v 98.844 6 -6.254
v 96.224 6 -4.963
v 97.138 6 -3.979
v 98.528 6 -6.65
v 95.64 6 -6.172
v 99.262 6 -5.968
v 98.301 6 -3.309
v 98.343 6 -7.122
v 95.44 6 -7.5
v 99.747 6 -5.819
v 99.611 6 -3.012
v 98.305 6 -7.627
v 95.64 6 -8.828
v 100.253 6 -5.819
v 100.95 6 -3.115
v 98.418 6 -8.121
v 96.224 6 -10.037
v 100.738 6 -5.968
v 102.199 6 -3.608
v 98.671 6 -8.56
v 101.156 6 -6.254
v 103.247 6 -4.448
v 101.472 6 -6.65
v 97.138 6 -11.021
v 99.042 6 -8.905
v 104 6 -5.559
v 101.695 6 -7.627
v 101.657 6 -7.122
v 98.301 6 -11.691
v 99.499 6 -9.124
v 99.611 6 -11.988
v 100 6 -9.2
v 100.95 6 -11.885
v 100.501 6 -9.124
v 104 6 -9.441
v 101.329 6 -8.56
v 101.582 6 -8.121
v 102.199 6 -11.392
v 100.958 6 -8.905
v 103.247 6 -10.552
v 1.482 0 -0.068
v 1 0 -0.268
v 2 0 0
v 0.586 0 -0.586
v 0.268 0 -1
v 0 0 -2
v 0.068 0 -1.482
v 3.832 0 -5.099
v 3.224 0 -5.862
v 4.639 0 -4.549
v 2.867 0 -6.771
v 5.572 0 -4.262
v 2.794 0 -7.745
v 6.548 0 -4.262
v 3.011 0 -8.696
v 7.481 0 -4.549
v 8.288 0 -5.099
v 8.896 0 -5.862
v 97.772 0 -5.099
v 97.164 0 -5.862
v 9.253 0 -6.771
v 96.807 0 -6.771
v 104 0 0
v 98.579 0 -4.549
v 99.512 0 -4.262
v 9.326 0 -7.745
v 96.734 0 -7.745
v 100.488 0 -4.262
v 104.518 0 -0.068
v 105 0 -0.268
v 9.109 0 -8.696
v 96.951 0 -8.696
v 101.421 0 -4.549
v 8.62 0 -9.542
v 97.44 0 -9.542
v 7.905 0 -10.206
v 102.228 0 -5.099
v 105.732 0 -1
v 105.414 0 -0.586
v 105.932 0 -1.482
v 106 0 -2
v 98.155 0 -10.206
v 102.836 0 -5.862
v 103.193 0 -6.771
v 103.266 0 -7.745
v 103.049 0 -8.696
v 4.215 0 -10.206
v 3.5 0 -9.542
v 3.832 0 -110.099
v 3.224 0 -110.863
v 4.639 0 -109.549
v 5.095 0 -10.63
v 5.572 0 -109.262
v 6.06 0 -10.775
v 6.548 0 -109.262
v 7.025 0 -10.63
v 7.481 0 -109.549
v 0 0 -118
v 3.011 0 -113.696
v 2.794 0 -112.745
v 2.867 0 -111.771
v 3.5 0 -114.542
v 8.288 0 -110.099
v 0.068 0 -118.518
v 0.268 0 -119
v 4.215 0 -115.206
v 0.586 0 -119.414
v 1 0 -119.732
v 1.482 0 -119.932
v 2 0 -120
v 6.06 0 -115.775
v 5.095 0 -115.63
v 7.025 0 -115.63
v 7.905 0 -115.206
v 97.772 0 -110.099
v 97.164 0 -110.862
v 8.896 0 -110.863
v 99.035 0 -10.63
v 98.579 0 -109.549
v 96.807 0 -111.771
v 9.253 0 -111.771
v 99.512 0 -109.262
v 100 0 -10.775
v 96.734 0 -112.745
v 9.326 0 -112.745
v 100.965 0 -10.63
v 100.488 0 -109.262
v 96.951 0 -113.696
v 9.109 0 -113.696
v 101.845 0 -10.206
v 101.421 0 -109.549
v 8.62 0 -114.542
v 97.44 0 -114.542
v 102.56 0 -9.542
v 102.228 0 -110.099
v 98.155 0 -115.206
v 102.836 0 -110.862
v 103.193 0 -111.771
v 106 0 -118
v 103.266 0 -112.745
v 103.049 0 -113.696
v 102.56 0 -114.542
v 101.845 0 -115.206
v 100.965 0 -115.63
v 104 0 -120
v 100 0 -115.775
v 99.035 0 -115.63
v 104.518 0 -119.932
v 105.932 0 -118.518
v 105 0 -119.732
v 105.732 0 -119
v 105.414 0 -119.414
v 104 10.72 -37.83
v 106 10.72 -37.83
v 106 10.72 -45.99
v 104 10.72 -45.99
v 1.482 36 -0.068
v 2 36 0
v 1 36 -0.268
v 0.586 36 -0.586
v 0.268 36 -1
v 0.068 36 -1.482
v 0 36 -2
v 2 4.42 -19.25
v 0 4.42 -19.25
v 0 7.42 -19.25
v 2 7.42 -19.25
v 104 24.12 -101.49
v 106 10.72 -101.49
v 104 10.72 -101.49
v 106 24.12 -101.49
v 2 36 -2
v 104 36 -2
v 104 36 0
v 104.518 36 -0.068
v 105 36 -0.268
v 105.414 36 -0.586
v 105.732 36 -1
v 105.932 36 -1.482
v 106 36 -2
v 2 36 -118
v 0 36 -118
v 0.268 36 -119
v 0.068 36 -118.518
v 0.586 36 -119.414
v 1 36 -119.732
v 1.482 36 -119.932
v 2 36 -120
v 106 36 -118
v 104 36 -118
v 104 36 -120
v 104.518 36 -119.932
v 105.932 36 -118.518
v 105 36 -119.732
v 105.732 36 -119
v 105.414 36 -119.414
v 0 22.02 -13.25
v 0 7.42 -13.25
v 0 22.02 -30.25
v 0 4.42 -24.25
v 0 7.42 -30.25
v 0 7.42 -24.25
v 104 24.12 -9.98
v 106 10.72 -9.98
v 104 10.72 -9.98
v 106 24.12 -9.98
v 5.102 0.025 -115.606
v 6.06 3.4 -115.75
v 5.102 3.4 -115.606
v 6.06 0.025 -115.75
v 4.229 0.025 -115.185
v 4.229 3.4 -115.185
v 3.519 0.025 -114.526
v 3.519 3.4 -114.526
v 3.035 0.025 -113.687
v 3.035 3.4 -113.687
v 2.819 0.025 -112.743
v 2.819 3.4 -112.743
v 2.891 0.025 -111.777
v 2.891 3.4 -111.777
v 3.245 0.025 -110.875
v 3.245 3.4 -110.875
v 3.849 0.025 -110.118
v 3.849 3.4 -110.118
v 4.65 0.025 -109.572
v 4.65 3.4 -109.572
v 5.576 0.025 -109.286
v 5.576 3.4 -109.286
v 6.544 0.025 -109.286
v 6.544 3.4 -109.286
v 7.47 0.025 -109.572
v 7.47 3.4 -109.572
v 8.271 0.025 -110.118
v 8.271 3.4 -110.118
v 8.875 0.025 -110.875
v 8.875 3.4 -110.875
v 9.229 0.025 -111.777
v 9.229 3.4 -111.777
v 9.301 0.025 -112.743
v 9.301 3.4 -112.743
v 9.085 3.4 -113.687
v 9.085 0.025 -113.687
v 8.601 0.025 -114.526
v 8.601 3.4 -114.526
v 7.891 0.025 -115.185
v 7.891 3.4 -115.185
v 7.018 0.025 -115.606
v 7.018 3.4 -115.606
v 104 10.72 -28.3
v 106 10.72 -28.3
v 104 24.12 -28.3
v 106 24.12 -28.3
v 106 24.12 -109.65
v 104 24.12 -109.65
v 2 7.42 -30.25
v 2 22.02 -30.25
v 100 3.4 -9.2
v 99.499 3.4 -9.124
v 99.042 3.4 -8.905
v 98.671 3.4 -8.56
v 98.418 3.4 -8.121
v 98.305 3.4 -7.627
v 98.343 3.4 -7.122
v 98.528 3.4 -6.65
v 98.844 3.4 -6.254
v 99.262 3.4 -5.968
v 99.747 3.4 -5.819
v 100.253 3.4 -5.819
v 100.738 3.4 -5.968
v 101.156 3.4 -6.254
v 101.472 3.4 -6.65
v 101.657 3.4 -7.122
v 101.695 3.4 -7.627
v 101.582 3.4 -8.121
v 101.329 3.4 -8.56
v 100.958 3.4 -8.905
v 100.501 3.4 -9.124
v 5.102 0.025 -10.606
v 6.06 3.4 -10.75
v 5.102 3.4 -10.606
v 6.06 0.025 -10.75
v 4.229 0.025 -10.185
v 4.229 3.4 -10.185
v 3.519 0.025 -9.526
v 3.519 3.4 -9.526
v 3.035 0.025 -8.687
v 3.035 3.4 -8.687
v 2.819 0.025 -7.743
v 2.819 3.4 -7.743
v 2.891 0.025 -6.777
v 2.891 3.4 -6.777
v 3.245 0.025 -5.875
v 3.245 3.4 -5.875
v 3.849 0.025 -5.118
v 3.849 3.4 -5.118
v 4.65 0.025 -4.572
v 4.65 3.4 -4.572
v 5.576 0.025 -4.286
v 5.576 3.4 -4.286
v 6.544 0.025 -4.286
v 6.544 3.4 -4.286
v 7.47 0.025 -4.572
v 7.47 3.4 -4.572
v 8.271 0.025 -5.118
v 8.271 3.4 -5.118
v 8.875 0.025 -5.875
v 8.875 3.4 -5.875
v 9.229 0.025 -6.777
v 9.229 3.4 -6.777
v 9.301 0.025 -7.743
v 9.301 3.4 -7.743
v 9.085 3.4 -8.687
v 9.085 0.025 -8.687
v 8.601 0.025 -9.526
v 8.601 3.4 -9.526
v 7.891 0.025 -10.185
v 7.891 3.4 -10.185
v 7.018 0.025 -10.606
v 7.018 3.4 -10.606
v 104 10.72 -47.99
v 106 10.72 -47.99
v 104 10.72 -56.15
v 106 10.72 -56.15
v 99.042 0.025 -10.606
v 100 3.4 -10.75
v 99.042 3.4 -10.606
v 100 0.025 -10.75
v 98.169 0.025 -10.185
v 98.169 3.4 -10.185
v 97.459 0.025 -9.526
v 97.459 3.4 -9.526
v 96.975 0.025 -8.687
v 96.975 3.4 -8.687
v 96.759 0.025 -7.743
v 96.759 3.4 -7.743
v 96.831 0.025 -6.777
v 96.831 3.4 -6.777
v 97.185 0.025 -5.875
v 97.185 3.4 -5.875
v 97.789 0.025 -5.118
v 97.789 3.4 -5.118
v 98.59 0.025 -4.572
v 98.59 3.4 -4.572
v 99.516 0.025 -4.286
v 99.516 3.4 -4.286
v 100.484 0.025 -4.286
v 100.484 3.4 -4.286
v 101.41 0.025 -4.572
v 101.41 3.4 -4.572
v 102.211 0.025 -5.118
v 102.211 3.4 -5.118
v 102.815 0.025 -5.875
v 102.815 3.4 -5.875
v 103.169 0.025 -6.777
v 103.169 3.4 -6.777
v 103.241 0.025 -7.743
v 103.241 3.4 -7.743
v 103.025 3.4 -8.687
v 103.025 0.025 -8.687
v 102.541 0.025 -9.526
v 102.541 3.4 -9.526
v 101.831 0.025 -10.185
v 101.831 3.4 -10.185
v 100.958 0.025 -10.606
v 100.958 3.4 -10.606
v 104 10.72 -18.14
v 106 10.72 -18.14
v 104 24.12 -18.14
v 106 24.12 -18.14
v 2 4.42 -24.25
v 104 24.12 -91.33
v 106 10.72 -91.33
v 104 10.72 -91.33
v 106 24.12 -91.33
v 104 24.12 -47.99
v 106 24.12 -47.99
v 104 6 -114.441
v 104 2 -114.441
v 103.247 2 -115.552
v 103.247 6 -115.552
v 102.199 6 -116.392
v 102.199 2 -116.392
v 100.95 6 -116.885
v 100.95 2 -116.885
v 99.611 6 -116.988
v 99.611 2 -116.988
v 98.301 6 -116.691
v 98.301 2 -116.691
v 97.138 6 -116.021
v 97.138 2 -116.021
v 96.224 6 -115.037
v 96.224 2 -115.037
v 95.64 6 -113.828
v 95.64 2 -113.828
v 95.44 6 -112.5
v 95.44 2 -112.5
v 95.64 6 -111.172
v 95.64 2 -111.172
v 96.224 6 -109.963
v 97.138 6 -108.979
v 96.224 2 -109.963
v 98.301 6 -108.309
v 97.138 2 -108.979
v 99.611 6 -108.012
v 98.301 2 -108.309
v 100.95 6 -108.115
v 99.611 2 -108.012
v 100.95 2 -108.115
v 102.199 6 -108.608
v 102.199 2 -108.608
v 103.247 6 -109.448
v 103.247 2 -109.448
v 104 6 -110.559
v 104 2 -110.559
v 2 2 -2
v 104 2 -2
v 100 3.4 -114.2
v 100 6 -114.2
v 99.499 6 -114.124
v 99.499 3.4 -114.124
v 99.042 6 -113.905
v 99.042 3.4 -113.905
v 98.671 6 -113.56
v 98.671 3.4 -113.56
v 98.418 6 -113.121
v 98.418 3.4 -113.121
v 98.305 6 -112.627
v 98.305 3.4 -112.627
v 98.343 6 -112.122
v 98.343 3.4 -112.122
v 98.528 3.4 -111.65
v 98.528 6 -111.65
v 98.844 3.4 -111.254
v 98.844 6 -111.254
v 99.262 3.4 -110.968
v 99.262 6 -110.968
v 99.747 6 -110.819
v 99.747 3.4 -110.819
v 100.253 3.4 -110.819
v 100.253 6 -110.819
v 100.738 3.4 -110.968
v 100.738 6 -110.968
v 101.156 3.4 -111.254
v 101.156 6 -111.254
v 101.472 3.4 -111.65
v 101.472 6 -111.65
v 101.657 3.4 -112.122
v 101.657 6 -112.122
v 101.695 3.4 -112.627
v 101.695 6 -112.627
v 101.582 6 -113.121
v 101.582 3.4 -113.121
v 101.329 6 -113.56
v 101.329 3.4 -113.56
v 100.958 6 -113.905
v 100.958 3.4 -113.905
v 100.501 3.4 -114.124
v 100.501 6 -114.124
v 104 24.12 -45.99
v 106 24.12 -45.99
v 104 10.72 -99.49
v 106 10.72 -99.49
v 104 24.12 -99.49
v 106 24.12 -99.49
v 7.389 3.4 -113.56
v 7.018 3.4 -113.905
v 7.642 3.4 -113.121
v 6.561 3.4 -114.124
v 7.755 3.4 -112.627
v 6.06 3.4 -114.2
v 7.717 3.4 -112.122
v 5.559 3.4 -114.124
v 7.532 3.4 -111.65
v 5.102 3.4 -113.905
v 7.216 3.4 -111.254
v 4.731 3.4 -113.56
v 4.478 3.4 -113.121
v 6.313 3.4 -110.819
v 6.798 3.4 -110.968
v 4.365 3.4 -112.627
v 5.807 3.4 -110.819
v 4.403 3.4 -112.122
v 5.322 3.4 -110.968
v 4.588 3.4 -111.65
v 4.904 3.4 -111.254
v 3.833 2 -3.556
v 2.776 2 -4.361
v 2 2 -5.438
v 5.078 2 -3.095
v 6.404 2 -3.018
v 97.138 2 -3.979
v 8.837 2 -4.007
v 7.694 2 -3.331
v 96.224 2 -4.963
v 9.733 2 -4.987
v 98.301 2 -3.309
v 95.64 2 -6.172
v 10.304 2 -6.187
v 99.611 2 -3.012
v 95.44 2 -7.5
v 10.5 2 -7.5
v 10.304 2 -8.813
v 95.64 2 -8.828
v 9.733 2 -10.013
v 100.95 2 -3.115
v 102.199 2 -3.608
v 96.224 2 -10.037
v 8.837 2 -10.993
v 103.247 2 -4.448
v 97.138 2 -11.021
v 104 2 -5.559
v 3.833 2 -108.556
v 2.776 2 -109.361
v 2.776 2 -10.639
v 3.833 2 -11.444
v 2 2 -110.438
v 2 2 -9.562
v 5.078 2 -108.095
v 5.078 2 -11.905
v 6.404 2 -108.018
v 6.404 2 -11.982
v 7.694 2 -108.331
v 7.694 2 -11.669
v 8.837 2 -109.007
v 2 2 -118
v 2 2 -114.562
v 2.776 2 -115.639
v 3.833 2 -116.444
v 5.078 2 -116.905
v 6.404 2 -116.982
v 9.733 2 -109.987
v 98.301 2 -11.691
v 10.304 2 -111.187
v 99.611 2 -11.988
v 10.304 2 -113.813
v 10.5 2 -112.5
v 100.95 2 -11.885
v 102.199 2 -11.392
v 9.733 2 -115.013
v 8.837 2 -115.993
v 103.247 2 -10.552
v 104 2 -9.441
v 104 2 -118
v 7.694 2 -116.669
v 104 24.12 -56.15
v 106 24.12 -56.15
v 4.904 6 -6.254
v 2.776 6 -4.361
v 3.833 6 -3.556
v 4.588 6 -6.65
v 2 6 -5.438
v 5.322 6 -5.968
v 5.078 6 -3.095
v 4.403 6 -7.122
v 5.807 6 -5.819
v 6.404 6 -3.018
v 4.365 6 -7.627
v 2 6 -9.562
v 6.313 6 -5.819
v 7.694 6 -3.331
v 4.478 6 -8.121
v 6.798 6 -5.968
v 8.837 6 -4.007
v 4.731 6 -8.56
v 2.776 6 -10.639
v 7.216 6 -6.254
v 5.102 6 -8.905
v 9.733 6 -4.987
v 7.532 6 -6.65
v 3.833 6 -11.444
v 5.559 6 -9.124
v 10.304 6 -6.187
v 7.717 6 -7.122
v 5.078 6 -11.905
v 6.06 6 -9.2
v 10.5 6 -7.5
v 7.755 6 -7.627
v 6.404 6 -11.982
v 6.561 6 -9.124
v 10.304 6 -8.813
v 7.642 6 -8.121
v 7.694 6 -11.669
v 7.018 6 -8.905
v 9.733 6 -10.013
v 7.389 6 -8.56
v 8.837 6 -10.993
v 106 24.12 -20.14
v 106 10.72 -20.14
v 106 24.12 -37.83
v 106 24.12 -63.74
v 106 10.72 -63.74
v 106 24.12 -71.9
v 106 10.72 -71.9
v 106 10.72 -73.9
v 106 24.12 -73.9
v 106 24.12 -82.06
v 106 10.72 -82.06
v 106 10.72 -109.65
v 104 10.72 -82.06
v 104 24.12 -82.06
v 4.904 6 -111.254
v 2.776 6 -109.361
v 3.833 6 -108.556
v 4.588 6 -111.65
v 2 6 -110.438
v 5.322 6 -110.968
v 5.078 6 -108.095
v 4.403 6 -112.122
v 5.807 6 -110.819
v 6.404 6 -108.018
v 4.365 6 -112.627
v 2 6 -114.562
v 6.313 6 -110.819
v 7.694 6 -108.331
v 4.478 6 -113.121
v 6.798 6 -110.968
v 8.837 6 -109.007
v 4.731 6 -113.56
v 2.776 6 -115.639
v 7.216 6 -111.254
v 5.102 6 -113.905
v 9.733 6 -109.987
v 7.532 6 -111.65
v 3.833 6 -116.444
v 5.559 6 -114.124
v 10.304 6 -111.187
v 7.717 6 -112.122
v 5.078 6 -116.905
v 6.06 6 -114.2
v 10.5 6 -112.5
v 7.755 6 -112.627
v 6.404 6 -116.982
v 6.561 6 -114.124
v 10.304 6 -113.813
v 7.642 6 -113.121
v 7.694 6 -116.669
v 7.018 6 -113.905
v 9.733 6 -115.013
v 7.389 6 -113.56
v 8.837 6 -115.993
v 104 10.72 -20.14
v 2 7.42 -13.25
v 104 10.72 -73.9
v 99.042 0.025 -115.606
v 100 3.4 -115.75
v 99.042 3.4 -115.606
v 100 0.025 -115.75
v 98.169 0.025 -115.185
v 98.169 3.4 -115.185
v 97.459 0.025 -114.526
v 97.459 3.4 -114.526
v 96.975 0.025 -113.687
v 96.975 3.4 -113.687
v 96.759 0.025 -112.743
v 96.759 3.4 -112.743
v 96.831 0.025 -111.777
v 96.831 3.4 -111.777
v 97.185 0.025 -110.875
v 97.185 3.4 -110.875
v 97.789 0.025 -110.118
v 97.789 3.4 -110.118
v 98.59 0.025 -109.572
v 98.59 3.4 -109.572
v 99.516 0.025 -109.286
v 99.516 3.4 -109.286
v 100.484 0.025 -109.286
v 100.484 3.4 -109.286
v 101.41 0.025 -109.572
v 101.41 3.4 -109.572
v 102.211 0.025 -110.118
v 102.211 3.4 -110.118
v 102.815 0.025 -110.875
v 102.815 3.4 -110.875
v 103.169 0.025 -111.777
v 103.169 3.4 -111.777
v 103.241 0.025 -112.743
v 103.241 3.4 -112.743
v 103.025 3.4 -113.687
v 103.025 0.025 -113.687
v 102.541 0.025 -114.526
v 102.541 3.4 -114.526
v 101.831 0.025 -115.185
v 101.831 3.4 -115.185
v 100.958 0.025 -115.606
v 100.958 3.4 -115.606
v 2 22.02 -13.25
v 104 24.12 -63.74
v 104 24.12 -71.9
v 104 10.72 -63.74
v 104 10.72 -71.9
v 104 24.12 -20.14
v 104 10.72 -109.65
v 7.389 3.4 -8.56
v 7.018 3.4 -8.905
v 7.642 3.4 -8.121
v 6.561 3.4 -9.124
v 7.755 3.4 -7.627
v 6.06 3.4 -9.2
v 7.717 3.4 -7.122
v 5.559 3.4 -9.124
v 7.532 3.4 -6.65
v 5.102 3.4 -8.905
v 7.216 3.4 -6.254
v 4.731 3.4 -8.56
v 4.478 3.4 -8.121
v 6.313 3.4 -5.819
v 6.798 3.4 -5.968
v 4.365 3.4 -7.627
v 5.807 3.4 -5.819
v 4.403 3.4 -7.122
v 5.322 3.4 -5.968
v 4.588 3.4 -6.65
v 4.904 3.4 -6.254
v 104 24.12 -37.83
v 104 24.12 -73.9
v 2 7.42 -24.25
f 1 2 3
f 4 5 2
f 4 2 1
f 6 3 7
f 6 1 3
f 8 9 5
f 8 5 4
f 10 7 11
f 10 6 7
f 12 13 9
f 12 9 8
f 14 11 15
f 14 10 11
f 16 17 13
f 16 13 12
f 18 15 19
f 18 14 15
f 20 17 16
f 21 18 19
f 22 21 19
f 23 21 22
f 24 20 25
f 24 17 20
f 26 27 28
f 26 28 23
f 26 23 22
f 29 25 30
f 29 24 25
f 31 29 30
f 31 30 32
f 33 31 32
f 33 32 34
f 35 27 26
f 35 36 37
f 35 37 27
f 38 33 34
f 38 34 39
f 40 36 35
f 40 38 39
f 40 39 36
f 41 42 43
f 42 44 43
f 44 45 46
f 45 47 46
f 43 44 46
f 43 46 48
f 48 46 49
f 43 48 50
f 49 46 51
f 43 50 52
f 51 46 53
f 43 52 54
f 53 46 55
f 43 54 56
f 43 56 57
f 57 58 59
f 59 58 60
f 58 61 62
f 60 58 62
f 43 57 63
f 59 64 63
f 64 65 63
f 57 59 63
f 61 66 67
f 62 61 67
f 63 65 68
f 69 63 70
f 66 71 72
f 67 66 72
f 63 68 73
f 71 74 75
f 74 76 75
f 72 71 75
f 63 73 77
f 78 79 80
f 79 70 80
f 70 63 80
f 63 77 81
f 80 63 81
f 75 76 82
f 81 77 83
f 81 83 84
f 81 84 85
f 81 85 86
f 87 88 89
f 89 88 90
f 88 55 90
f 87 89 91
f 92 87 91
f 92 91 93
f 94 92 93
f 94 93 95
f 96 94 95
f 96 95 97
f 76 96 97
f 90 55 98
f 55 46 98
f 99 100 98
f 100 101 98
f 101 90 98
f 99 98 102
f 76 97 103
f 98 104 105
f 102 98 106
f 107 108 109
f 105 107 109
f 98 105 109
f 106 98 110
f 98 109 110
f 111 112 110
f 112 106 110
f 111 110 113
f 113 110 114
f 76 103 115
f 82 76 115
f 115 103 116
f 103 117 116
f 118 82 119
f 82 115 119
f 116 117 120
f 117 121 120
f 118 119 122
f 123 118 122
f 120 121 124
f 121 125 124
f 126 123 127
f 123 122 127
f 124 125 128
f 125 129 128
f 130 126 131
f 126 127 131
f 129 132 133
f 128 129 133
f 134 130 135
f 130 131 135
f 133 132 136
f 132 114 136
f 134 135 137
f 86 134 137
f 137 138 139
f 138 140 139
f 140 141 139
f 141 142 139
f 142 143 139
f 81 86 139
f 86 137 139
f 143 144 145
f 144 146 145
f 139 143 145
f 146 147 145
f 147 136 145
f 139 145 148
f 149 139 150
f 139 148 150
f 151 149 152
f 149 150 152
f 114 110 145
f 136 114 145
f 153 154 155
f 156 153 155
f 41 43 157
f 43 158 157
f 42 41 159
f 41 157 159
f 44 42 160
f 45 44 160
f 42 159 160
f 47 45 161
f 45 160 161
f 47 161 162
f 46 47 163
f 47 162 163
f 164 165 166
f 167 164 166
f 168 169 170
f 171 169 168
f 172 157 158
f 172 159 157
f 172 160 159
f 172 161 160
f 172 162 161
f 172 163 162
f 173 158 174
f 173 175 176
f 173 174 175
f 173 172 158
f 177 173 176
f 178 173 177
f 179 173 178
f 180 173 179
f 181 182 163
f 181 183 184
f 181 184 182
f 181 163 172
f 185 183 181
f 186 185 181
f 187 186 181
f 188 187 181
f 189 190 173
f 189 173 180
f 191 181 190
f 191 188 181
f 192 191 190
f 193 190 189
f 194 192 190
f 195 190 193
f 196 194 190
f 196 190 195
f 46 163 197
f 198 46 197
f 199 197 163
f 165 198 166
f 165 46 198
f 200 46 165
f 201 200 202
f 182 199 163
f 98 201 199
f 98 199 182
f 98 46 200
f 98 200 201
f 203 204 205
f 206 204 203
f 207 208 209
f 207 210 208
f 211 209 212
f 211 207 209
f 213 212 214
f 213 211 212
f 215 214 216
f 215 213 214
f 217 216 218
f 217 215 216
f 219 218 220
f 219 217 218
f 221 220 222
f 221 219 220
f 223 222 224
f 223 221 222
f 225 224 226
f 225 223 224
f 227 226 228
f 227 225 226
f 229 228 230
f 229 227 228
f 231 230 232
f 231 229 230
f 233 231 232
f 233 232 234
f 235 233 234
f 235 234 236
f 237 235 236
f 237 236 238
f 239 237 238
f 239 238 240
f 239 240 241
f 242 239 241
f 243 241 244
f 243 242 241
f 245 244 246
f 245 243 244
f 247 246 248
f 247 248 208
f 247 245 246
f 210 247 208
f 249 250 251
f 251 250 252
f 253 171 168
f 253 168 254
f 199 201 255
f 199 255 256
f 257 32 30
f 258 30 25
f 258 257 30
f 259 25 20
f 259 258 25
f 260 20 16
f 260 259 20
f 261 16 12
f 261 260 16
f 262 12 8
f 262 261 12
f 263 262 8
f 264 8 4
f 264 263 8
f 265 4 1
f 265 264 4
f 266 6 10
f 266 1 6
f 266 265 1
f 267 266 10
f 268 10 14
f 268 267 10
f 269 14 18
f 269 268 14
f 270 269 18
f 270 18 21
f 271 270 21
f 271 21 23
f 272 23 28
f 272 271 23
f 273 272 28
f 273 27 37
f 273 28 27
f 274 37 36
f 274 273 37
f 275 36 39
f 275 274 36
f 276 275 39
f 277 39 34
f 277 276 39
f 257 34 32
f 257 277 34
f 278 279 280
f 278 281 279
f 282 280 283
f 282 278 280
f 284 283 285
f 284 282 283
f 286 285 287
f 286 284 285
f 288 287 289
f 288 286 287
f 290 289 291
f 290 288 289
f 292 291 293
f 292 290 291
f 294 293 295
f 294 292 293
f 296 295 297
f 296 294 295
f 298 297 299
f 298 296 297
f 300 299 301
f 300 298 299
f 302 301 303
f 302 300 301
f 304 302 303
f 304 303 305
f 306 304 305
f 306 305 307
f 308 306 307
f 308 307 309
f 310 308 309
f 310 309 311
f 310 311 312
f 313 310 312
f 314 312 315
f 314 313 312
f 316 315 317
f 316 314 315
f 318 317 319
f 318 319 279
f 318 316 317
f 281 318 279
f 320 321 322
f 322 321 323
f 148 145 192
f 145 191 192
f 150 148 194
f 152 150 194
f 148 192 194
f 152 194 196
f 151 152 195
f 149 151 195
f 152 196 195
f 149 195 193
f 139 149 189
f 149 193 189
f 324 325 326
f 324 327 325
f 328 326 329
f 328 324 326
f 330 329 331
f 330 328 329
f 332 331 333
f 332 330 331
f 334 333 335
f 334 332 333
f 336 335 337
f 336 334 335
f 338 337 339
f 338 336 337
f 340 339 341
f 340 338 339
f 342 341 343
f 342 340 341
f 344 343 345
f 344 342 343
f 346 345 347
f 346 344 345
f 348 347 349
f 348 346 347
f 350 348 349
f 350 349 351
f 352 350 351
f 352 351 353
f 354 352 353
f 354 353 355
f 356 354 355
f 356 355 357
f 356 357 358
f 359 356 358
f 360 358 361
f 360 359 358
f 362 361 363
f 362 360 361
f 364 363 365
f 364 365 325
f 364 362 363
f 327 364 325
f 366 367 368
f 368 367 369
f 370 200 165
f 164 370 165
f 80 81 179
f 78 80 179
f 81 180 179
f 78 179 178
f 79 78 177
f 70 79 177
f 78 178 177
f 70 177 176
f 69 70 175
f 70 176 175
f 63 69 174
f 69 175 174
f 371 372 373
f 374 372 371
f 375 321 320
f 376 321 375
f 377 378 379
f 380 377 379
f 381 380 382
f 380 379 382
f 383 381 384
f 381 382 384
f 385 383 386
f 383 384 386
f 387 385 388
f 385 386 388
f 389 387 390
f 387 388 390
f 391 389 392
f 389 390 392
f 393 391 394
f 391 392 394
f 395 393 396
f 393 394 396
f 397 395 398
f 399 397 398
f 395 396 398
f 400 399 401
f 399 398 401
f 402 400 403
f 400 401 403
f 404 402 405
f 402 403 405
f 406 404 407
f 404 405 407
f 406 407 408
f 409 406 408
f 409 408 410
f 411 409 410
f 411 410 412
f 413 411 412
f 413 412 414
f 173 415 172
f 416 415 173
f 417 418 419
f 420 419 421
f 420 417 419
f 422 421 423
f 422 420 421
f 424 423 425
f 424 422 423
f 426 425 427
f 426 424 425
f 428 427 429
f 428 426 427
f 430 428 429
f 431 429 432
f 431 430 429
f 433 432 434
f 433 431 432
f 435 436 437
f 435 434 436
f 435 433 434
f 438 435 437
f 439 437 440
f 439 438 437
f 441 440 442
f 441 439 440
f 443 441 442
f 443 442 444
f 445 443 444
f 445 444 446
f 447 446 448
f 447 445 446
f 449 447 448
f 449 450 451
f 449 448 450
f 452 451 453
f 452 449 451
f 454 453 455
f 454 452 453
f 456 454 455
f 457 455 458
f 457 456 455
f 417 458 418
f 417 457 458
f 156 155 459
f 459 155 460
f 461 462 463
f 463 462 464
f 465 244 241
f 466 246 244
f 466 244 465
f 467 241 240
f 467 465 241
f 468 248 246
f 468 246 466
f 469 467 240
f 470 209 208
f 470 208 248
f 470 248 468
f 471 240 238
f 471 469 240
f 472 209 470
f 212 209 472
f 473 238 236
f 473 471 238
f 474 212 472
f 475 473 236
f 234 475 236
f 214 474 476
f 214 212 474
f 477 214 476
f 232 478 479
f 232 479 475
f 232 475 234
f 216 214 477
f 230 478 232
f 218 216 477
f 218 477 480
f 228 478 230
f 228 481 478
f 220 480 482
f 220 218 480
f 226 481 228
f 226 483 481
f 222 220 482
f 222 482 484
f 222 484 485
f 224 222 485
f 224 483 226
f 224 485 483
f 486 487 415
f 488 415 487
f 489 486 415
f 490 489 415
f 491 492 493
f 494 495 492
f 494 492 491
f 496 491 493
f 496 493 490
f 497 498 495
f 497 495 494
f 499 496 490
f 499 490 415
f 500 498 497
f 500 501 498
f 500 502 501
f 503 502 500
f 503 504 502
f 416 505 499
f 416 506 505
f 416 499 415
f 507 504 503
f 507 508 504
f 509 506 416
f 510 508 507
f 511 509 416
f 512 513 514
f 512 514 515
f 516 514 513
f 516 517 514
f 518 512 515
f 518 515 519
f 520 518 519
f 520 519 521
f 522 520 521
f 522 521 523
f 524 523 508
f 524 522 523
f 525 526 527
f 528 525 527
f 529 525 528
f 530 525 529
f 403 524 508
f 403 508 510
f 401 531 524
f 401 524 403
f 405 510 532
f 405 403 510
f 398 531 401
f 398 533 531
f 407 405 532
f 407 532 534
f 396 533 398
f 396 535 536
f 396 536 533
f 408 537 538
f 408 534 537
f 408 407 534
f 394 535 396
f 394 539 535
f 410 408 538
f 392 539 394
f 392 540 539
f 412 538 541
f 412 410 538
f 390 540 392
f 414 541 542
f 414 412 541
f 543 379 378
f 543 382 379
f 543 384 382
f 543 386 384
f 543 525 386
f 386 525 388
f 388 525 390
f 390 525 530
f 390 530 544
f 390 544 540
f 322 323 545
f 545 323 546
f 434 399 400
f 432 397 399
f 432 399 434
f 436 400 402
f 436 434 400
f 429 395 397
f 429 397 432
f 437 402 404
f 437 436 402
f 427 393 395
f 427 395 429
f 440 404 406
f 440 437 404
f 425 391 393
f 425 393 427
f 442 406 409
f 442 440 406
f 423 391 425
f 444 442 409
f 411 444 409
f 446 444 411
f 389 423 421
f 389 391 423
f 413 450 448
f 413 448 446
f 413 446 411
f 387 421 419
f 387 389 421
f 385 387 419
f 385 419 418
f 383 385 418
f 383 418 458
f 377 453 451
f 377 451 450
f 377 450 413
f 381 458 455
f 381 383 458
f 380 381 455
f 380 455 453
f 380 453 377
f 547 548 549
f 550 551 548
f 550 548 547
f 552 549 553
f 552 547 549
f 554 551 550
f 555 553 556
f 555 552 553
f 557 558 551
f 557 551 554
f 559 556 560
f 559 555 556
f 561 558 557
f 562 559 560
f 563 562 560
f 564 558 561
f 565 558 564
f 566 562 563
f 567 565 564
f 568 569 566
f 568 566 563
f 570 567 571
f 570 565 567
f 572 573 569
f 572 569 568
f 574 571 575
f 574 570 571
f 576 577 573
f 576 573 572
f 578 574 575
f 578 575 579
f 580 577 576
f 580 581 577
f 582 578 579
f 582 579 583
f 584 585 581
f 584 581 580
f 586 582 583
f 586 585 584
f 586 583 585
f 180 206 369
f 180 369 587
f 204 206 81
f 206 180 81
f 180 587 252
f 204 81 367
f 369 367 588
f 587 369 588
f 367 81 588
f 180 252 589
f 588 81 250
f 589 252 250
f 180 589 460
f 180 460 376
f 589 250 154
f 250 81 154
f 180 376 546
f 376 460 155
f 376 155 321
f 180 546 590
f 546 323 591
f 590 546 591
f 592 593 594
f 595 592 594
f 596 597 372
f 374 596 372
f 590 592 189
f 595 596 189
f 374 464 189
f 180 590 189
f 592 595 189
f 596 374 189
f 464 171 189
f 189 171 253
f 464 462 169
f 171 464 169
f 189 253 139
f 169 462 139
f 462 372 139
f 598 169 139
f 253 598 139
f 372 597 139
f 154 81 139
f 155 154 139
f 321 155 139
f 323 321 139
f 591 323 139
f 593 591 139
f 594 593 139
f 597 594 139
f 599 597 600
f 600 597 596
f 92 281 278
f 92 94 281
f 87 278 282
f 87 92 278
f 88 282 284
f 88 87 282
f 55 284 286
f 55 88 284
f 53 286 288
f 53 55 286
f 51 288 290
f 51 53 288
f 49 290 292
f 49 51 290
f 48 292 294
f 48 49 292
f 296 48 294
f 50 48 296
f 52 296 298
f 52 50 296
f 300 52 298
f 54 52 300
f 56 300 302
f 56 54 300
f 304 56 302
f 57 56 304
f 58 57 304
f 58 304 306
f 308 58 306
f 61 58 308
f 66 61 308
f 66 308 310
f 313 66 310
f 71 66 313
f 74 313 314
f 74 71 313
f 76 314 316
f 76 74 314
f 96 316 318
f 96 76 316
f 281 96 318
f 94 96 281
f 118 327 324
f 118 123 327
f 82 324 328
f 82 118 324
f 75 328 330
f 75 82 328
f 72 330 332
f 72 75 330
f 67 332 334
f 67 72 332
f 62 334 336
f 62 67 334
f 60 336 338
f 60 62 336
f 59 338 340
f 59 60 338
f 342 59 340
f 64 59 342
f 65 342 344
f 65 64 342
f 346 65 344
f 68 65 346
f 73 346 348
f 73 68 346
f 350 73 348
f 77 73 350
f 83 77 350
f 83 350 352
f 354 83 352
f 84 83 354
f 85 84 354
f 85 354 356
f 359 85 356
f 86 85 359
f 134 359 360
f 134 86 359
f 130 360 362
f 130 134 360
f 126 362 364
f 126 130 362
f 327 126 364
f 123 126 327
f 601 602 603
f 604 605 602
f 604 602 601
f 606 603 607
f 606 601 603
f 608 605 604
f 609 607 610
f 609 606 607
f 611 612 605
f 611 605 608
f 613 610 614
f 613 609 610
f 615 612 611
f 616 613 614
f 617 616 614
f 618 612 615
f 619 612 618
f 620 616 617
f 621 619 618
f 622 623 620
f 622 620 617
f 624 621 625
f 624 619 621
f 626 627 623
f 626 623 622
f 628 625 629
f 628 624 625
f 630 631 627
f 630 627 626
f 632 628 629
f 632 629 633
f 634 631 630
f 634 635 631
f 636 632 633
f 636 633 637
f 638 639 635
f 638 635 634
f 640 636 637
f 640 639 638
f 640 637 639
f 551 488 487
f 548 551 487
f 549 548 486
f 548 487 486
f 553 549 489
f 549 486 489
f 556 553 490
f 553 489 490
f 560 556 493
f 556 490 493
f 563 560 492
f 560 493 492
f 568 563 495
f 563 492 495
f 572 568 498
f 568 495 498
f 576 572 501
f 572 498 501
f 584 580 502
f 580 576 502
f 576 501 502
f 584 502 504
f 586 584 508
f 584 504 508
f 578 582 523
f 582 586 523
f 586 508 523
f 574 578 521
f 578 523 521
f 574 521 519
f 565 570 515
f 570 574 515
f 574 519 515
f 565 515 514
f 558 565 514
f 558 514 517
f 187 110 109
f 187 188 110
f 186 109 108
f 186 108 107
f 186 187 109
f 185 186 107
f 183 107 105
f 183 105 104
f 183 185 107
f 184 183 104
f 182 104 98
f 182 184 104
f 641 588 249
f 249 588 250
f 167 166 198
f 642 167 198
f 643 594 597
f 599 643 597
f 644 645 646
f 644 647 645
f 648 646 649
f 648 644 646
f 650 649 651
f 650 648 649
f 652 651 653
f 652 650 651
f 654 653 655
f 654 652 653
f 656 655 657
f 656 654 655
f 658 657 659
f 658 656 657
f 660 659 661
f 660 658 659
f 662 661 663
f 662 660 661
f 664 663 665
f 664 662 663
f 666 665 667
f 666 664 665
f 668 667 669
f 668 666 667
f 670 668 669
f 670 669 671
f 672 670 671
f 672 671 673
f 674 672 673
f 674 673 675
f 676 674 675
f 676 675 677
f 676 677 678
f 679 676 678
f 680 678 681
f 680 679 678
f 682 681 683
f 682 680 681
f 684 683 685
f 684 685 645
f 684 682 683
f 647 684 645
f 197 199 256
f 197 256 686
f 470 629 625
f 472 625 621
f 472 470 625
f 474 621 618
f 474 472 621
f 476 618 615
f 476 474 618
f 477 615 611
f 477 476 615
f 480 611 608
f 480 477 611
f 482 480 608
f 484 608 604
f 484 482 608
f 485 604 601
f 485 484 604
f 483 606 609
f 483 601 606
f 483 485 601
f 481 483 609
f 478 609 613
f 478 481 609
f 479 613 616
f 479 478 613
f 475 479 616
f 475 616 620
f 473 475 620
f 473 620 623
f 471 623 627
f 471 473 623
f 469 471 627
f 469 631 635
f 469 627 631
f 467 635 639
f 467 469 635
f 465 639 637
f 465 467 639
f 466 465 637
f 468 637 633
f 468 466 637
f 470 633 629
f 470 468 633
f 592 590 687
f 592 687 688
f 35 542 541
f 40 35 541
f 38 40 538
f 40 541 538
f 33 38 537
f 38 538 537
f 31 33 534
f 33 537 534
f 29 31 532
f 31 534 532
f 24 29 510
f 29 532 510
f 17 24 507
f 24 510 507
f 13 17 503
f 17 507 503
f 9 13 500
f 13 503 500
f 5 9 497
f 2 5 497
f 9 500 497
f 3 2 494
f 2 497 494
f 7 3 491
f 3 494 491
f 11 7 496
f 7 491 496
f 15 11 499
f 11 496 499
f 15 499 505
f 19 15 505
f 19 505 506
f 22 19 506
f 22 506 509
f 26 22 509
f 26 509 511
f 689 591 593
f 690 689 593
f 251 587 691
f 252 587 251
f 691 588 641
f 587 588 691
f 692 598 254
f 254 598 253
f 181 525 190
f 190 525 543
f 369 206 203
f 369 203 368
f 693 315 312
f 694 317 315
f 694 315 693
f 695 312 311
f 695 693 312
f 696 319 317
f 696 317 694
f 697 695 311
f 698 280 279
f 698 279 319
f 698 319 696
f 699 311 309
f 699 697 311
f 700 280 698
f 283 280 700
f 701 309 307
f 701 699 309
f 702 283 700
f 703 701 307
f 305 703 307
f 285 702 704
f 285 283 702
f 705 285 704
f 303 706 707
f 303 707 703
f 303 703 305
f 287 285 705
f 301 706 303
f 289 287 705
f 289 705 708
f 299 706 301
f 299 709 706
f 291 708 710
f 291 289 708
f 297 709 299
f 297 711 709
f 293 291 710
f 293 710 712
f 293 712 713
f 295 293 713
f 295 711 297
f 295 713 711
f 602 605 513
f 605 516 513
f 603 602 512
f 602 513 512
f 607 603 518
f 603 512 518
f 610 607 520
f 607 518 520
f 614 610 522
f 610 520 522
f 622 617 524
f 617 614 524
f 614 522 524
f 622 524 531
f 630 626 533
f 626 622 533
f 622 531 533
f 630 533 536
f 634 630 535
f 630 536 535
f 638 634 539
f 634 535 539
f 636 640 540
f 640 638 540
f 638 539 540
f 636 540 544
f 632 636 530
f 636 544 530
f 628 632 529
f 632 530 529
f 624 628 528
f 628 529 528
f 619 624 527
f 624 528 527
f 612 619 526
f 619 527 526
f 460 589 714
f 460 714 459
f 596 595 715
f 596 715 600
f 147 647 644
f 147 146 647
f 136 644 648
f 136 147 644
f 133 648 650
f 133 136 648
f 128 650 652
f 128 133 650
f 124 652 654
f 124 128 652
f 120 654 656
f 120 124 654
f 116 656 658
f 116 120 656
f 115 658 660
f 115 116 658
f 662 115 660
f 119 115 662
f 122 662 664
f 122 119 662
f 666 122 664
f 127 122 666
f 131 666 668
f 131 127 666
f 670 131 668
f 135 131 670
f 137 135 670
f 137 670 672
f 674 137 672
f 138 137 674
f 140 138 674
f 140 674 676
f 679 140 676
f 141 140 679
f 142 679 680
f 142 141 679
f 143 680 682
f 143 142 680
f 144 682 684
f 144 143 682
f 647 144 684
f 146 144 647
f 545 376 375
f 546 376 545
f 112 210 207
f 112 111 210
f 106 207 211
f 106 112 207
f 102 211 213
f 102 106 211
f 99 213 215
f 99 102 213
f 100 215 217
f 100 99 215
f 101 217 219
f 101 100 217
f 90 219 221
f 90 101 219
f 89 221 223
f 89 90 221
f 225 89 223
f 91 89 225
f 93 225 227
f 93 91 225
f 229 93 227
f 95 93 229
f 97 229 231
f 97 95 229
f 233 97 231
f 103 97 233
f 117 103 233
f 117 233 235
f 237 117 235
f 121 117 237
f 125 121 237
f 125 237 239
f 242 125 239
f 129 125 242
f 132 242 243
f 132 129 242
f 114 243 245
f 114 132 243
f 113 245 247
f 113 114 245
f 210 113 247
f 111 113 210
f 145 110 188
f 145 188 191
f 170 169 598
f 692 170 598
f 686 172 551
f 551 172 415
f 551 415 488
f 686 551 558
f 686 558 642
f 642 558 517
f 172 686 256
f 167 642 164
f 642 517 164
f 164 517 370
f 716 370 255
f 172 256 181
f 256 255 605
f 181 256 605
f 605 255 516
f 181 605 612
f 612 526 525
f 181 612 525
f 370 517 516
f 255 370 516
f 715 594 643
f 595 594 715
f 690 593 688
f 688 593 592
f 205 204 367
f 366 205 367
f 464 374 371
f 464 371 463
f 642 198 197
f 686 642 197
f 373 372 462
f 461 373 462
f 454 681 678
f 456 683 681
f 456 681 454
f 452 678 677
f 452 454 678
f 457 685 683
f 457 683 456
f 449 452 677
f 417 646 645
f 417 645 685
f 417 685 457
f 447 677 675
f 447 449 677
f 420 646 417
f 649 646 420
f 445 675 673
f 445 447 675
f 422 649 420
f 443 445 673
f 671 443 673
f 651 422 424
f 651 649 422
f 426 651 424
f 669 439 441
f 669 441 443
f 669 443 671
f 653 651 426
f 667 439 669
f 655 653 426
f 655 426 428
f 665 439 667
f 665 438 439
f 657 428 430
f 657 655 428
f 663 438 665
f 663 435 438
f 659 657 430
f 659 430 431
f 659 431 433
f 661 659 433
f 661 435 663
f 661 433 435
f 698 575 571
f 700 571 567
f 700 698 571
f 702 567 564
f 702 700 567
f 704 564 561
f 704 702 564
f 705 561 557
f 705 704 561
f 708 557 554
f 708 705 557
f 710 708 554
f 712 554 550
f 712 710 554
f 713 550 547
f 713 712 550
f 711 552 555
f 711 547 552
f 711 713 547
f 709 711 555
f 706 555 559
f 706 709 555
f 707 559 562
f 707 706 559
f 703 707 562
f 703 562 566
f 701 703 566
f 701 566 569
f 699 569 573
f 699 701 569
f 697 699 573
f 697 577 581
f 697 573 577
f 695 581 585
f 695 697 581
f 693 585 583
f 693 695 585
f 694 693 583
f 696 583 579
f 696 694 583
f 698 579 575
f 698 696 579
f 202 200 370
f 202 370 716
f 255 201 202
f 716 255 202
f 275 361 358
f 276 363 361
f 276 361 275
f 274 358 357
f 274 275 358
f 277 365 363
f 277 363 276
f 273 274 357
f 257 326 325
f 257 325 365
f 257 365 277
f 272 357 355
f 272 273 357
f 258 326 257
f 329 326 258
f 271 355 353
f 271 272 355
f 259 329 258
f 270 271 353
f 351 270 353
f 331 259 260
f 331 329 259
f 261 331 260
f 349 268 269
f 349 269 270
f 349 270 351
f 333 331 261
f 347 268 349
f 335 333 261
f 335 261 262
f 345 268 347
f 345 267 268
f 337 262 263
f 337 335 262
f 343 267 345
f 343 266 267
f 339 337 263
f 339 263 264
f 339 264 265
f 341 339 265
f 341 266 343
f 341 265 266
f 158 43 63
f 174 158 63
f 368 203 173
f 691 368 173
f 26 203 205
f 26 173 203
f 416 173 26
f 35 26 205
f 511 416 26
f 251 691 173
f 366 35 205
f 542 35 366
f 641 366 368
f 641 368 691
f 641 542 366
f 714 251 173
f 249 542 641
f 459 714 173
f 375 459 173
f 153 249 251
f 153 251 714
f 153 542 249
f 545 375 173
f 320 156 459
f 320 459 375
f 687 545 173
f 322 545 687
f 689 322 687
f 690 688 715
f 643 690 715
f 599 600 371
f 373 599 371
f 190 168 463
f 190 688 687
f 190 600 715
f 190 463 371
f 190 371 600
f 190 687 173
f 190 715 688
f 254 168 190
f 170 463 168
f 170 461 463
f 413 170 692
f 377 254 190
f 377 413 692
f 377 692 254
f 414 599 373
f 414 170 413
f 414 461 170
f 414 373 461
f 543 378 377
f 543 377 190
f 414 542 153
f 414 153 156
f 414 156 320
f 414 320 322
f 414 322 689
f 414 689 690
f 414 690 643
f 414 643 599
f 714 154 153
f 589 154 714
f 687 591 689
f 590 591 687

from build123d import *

# Parameters (mm, degrees)
SKIZZE1_W                                    = 106
SKIZZE1_H                                    = 120
AUFSATZ_LINEAR_AUSTRAGEN1_DEPTH              = 36
WANDUNG1_T                                   = -2
SKIZZE2_R                                    = 4.5
AUFSATZ_LINEAR_AUSTRAGEN2_DEPTH              = 4
VERRUNDUNG1_R                                = 2
STIRNSENKUNG_F_R_M3_ZYLINDERSCHRAUBE_2_COUNT = 2
STIRNSENKUNG_F_R_M3_ZYLINDERSCHRAUBE_2_PITCH = 140.889047126
STIRNSENKUNG_F_R_M3_ZYLINDERSCHRAUBE_3_COUNT = 2
STIRNSENKUNG_F_R_M3_ZYLINDERSCHRAUBE_3_PITCH = 105
STIRNSENKUNG_F_R_M3_ZYLINDERSCHRAUBE_4_COUNT = 2
STIRNSENKUNG_F_R_M3_ZYLINDERSCHRAUBE_4_PITCH = 93.94
SKIZZE7_W                                    = 17
SKIZZE7_H                                    = 14.6
SCHNITT_LINEAR_AUSTRAGEN1_DEPTH              = 10
SKIZZE8_W                                    = 8.16
SKIZZE8_H                                    = 13.4
SCHNITT_LINEAR_AUSTRAGEN2_DEPTH              = 10
LINEARES_MUSTER2_COUNT                       = 2
LINEARES_MUSTER2_PITCH                       = 27.85
LINEARES_MUSTER3_COUNT                       = 2
LINEARES_MUSTER3_PITCH                       = 53.76
LINEARES_MUSTER4_COUNT                       = 2
LINEARES_MUSTER4_PITCH                       = 81.35
SKIZZE10_W                                   = 5
SKIZZE10_H                                   = 3
SCHNITT_LINEAR_AUSTRAGEN3_DEPTH              = 3


with BuildPart() as part:
    # Skizze1 → Aufsatz-Linear austragen1 (new body)
    with BuildSketch(Plane(origin=(0, 0, 0), x_dir=(1, 0, 0), z_dir=(0, 1, 0))):
        with Locations((53, 60)):
            Rectangle(SKIZZE1_W, SKIZZE1_H)
    extrude(amount=AUFSATZ_LINEAR_AUSTRAGEN1_DEPTH)

    # Wandung1
    wandung1_openings = [part.faces().sort_by_distance(p)[0] for p in [
        (53, 36, -60),
    ]]
    offset(amount=WANDUNG1_T, openings=wandung1_openings, kind=Kind.INTERSECTION)

    # Skizze2 → Aufsatz-Linear austragen2 (add)
    with BuildSketch(Plane(origin=(0, 2, 0), x_dir=(1, 0, 0), z_dir=(0, 1, 0))):
        with Locations((6, 7.5)):
            Circle(SKIZZE2_R)
        with Locations((99.94, 7.5)):
            Circle(SKIZZE2_R)
        with Locations((99.94, 112.5)):
            Circle(SKIZZE2_R)
        with Locations((6, 112.5)):
            Circle(SKIZZE2_R)
    extrude(amount=AUFSATZ_LINEAR_AUSTRAGEN2_DEPTH)

    # Verrundung1
    verrundung1_edges = [part.edges().sort_by_distance(p)[0] for p in [
        (0, 18, -120),
        (106, 18, -120),
        (106, 18, 0),
        (0, 18, 0),
    ]]
    fillet(verrundung1_edges, radius=VERRUNDUNG1_R)

    # Skizze6 → Stirnsenkung für M3 Zylinderschraube mit Innensechskant1 (revolve, cut)
    with BuildSketch(Plane(origin=(100, 0, -7.5), x_dir=(0, 0, -1), z_dir=(1, 0, 0))):
        Polygon((0, 0), (0, 15.021463052), (1.7, 14), (1.7, 3.4), (3.25, 3.4), (3.25, 0.025), (3.275, 0), align=None)
    stirnsenkung_f_r_m3_zylinderschraube_mit = revolve(axis=Axis((100, -6.35, -7.5), (0, 1, 0)), mode=Mode.SUBTRACT)

    # Stirnsenkung f_r M3 Zylinderschraube 2: Stirnsenkung für M3 Zylinderschraube mit Innensechskant1 ×2
    with Locations(*[Vector(-0.6667658126480086, 0, -0.7452673017675208) * (i * STIRNSENKUNG_F_R_M3_ZYLINDERSCHRAUBE_2_PITCH) for i in range(1, STIRNSENKUNG_F_R_M3_ZYLINDERSCHRAUBE_2_COUNT)]):
        add(stirnsenkung_f_r_m3_zylinderschraube_mit, mode=Mode.SUBTRACT)

    # Stirnsenkung f_r M3 Zylinderschraube 3: Stirnsenkung für M3 Zylinderschraube mit Innensechskant1 ×2
    with Locations(*[(0, 0, -i * STIRNSENKUNG_F_R_M3_ZYLINDERSCHRAUBE_3_PITCH) for i in range(1, STIRNSENKUNG_F_R_M3_ZYLINDERSCHRAUBE_3_COUNT)]):
        add(stirnsenkung_f_r_m3_zylinderschraube_mit, mode=Mode.SUBTRACT)

    # Stirnsenkung f_r M3 Zylinderschraube 4: Stirnsenkung für M3 Zylinderschraube mit Innensechskant1 ×2
    with Locations(*[(-i * STIRNSENKUNG_F_R_M3_ZYLINDERSCHRAUBE_4_PITCH, 0, 0) for i in range(1, STIRNSENKUNG_F_R_M3_ZYLINDERSCHRAUBE_4_COUNT)]):
        add(stirnsenkung_f_r_m3_zylinderschraube_mit, mode=Mode.SUBTRACT)

    # Skizze7 → Schnitt-Linear austragen1 (cut)
    with BuildSketch(Plane.ZY):
        with Locations((-21.75, 14.72)):
            Rectangle(SKIZZE7_W, SKIZZE7_H)
    extrude(amount=-SCHNITT_LINEAR_AUSTRAGEN1_DEPTH, mode=Mode.SUBTRACT)

    # Skizze8 → Schnitt-Linear austragen2 (cut)
    with BuildSketch(Plane(origin=(106, 0, 0), x_dir=(0, 0, -1), z_dir=(1, 0, 0))):
        with Locations((14.06, 17.42)):
            Rectangle(SKIZZE8_W, SKIZZE8_H)
        with Locations((24.22, 17.42)):
            Rectangle(SKIZZE8_W, SKIZZE8_H)
    schnitt_linear_austragen2 = extrude(amount=-SCHNITT_LINEAR_AUSTRAGEN2_DEPTH, mode=Mode.SUBTRACT)

    # Lineares Muster2: Schnitt-Linear austragen2 ×2
    with Locations(*[(0, 0, -i * LINEARES_MUSTER2_PITCH) for i in range(1, LINEARES_MUSTER2_COUNT)]):
        add(schnitt_linear_austragen2, mode=Mode.SUBTRACT)

    # Lineares Muster3: Schnitt-Linear austragen2 ×2
    with Locations(*[(0, 0, -i * LINEARES_MUSTER3_PITCH) for i in range(1, LINEARES_MUSTER3_COUNT)]):
        add(schnitt_linear_austragen2, mode=Mode.SUBTRACT)

    # Lineares Muster4: Schnitt-Linear austragen2 ×2
    with Locations(*[(0, 0, -i * LINEARES_MUSTER4_PITCH) for i in range(1, LINEARES_MUSTER4_COUNT)]):
        add(schnitt_linear_austragen2, mode=Mode.SUBTRACT)

    # Skizze10 → Schnitt-Linear austragen3 (cut)
    with BuildSketch(Plane.ZY):
        with Locations((-21.75, 5.92)):
            Rectangle(SKIZZE10_W, SKIZZE10_H)
    extrude(amount=-SCHNITT_LINEAR_AUSTRAGEN3_DEPTH, mode=Mode.SUBTRACT)


solid = part.part
